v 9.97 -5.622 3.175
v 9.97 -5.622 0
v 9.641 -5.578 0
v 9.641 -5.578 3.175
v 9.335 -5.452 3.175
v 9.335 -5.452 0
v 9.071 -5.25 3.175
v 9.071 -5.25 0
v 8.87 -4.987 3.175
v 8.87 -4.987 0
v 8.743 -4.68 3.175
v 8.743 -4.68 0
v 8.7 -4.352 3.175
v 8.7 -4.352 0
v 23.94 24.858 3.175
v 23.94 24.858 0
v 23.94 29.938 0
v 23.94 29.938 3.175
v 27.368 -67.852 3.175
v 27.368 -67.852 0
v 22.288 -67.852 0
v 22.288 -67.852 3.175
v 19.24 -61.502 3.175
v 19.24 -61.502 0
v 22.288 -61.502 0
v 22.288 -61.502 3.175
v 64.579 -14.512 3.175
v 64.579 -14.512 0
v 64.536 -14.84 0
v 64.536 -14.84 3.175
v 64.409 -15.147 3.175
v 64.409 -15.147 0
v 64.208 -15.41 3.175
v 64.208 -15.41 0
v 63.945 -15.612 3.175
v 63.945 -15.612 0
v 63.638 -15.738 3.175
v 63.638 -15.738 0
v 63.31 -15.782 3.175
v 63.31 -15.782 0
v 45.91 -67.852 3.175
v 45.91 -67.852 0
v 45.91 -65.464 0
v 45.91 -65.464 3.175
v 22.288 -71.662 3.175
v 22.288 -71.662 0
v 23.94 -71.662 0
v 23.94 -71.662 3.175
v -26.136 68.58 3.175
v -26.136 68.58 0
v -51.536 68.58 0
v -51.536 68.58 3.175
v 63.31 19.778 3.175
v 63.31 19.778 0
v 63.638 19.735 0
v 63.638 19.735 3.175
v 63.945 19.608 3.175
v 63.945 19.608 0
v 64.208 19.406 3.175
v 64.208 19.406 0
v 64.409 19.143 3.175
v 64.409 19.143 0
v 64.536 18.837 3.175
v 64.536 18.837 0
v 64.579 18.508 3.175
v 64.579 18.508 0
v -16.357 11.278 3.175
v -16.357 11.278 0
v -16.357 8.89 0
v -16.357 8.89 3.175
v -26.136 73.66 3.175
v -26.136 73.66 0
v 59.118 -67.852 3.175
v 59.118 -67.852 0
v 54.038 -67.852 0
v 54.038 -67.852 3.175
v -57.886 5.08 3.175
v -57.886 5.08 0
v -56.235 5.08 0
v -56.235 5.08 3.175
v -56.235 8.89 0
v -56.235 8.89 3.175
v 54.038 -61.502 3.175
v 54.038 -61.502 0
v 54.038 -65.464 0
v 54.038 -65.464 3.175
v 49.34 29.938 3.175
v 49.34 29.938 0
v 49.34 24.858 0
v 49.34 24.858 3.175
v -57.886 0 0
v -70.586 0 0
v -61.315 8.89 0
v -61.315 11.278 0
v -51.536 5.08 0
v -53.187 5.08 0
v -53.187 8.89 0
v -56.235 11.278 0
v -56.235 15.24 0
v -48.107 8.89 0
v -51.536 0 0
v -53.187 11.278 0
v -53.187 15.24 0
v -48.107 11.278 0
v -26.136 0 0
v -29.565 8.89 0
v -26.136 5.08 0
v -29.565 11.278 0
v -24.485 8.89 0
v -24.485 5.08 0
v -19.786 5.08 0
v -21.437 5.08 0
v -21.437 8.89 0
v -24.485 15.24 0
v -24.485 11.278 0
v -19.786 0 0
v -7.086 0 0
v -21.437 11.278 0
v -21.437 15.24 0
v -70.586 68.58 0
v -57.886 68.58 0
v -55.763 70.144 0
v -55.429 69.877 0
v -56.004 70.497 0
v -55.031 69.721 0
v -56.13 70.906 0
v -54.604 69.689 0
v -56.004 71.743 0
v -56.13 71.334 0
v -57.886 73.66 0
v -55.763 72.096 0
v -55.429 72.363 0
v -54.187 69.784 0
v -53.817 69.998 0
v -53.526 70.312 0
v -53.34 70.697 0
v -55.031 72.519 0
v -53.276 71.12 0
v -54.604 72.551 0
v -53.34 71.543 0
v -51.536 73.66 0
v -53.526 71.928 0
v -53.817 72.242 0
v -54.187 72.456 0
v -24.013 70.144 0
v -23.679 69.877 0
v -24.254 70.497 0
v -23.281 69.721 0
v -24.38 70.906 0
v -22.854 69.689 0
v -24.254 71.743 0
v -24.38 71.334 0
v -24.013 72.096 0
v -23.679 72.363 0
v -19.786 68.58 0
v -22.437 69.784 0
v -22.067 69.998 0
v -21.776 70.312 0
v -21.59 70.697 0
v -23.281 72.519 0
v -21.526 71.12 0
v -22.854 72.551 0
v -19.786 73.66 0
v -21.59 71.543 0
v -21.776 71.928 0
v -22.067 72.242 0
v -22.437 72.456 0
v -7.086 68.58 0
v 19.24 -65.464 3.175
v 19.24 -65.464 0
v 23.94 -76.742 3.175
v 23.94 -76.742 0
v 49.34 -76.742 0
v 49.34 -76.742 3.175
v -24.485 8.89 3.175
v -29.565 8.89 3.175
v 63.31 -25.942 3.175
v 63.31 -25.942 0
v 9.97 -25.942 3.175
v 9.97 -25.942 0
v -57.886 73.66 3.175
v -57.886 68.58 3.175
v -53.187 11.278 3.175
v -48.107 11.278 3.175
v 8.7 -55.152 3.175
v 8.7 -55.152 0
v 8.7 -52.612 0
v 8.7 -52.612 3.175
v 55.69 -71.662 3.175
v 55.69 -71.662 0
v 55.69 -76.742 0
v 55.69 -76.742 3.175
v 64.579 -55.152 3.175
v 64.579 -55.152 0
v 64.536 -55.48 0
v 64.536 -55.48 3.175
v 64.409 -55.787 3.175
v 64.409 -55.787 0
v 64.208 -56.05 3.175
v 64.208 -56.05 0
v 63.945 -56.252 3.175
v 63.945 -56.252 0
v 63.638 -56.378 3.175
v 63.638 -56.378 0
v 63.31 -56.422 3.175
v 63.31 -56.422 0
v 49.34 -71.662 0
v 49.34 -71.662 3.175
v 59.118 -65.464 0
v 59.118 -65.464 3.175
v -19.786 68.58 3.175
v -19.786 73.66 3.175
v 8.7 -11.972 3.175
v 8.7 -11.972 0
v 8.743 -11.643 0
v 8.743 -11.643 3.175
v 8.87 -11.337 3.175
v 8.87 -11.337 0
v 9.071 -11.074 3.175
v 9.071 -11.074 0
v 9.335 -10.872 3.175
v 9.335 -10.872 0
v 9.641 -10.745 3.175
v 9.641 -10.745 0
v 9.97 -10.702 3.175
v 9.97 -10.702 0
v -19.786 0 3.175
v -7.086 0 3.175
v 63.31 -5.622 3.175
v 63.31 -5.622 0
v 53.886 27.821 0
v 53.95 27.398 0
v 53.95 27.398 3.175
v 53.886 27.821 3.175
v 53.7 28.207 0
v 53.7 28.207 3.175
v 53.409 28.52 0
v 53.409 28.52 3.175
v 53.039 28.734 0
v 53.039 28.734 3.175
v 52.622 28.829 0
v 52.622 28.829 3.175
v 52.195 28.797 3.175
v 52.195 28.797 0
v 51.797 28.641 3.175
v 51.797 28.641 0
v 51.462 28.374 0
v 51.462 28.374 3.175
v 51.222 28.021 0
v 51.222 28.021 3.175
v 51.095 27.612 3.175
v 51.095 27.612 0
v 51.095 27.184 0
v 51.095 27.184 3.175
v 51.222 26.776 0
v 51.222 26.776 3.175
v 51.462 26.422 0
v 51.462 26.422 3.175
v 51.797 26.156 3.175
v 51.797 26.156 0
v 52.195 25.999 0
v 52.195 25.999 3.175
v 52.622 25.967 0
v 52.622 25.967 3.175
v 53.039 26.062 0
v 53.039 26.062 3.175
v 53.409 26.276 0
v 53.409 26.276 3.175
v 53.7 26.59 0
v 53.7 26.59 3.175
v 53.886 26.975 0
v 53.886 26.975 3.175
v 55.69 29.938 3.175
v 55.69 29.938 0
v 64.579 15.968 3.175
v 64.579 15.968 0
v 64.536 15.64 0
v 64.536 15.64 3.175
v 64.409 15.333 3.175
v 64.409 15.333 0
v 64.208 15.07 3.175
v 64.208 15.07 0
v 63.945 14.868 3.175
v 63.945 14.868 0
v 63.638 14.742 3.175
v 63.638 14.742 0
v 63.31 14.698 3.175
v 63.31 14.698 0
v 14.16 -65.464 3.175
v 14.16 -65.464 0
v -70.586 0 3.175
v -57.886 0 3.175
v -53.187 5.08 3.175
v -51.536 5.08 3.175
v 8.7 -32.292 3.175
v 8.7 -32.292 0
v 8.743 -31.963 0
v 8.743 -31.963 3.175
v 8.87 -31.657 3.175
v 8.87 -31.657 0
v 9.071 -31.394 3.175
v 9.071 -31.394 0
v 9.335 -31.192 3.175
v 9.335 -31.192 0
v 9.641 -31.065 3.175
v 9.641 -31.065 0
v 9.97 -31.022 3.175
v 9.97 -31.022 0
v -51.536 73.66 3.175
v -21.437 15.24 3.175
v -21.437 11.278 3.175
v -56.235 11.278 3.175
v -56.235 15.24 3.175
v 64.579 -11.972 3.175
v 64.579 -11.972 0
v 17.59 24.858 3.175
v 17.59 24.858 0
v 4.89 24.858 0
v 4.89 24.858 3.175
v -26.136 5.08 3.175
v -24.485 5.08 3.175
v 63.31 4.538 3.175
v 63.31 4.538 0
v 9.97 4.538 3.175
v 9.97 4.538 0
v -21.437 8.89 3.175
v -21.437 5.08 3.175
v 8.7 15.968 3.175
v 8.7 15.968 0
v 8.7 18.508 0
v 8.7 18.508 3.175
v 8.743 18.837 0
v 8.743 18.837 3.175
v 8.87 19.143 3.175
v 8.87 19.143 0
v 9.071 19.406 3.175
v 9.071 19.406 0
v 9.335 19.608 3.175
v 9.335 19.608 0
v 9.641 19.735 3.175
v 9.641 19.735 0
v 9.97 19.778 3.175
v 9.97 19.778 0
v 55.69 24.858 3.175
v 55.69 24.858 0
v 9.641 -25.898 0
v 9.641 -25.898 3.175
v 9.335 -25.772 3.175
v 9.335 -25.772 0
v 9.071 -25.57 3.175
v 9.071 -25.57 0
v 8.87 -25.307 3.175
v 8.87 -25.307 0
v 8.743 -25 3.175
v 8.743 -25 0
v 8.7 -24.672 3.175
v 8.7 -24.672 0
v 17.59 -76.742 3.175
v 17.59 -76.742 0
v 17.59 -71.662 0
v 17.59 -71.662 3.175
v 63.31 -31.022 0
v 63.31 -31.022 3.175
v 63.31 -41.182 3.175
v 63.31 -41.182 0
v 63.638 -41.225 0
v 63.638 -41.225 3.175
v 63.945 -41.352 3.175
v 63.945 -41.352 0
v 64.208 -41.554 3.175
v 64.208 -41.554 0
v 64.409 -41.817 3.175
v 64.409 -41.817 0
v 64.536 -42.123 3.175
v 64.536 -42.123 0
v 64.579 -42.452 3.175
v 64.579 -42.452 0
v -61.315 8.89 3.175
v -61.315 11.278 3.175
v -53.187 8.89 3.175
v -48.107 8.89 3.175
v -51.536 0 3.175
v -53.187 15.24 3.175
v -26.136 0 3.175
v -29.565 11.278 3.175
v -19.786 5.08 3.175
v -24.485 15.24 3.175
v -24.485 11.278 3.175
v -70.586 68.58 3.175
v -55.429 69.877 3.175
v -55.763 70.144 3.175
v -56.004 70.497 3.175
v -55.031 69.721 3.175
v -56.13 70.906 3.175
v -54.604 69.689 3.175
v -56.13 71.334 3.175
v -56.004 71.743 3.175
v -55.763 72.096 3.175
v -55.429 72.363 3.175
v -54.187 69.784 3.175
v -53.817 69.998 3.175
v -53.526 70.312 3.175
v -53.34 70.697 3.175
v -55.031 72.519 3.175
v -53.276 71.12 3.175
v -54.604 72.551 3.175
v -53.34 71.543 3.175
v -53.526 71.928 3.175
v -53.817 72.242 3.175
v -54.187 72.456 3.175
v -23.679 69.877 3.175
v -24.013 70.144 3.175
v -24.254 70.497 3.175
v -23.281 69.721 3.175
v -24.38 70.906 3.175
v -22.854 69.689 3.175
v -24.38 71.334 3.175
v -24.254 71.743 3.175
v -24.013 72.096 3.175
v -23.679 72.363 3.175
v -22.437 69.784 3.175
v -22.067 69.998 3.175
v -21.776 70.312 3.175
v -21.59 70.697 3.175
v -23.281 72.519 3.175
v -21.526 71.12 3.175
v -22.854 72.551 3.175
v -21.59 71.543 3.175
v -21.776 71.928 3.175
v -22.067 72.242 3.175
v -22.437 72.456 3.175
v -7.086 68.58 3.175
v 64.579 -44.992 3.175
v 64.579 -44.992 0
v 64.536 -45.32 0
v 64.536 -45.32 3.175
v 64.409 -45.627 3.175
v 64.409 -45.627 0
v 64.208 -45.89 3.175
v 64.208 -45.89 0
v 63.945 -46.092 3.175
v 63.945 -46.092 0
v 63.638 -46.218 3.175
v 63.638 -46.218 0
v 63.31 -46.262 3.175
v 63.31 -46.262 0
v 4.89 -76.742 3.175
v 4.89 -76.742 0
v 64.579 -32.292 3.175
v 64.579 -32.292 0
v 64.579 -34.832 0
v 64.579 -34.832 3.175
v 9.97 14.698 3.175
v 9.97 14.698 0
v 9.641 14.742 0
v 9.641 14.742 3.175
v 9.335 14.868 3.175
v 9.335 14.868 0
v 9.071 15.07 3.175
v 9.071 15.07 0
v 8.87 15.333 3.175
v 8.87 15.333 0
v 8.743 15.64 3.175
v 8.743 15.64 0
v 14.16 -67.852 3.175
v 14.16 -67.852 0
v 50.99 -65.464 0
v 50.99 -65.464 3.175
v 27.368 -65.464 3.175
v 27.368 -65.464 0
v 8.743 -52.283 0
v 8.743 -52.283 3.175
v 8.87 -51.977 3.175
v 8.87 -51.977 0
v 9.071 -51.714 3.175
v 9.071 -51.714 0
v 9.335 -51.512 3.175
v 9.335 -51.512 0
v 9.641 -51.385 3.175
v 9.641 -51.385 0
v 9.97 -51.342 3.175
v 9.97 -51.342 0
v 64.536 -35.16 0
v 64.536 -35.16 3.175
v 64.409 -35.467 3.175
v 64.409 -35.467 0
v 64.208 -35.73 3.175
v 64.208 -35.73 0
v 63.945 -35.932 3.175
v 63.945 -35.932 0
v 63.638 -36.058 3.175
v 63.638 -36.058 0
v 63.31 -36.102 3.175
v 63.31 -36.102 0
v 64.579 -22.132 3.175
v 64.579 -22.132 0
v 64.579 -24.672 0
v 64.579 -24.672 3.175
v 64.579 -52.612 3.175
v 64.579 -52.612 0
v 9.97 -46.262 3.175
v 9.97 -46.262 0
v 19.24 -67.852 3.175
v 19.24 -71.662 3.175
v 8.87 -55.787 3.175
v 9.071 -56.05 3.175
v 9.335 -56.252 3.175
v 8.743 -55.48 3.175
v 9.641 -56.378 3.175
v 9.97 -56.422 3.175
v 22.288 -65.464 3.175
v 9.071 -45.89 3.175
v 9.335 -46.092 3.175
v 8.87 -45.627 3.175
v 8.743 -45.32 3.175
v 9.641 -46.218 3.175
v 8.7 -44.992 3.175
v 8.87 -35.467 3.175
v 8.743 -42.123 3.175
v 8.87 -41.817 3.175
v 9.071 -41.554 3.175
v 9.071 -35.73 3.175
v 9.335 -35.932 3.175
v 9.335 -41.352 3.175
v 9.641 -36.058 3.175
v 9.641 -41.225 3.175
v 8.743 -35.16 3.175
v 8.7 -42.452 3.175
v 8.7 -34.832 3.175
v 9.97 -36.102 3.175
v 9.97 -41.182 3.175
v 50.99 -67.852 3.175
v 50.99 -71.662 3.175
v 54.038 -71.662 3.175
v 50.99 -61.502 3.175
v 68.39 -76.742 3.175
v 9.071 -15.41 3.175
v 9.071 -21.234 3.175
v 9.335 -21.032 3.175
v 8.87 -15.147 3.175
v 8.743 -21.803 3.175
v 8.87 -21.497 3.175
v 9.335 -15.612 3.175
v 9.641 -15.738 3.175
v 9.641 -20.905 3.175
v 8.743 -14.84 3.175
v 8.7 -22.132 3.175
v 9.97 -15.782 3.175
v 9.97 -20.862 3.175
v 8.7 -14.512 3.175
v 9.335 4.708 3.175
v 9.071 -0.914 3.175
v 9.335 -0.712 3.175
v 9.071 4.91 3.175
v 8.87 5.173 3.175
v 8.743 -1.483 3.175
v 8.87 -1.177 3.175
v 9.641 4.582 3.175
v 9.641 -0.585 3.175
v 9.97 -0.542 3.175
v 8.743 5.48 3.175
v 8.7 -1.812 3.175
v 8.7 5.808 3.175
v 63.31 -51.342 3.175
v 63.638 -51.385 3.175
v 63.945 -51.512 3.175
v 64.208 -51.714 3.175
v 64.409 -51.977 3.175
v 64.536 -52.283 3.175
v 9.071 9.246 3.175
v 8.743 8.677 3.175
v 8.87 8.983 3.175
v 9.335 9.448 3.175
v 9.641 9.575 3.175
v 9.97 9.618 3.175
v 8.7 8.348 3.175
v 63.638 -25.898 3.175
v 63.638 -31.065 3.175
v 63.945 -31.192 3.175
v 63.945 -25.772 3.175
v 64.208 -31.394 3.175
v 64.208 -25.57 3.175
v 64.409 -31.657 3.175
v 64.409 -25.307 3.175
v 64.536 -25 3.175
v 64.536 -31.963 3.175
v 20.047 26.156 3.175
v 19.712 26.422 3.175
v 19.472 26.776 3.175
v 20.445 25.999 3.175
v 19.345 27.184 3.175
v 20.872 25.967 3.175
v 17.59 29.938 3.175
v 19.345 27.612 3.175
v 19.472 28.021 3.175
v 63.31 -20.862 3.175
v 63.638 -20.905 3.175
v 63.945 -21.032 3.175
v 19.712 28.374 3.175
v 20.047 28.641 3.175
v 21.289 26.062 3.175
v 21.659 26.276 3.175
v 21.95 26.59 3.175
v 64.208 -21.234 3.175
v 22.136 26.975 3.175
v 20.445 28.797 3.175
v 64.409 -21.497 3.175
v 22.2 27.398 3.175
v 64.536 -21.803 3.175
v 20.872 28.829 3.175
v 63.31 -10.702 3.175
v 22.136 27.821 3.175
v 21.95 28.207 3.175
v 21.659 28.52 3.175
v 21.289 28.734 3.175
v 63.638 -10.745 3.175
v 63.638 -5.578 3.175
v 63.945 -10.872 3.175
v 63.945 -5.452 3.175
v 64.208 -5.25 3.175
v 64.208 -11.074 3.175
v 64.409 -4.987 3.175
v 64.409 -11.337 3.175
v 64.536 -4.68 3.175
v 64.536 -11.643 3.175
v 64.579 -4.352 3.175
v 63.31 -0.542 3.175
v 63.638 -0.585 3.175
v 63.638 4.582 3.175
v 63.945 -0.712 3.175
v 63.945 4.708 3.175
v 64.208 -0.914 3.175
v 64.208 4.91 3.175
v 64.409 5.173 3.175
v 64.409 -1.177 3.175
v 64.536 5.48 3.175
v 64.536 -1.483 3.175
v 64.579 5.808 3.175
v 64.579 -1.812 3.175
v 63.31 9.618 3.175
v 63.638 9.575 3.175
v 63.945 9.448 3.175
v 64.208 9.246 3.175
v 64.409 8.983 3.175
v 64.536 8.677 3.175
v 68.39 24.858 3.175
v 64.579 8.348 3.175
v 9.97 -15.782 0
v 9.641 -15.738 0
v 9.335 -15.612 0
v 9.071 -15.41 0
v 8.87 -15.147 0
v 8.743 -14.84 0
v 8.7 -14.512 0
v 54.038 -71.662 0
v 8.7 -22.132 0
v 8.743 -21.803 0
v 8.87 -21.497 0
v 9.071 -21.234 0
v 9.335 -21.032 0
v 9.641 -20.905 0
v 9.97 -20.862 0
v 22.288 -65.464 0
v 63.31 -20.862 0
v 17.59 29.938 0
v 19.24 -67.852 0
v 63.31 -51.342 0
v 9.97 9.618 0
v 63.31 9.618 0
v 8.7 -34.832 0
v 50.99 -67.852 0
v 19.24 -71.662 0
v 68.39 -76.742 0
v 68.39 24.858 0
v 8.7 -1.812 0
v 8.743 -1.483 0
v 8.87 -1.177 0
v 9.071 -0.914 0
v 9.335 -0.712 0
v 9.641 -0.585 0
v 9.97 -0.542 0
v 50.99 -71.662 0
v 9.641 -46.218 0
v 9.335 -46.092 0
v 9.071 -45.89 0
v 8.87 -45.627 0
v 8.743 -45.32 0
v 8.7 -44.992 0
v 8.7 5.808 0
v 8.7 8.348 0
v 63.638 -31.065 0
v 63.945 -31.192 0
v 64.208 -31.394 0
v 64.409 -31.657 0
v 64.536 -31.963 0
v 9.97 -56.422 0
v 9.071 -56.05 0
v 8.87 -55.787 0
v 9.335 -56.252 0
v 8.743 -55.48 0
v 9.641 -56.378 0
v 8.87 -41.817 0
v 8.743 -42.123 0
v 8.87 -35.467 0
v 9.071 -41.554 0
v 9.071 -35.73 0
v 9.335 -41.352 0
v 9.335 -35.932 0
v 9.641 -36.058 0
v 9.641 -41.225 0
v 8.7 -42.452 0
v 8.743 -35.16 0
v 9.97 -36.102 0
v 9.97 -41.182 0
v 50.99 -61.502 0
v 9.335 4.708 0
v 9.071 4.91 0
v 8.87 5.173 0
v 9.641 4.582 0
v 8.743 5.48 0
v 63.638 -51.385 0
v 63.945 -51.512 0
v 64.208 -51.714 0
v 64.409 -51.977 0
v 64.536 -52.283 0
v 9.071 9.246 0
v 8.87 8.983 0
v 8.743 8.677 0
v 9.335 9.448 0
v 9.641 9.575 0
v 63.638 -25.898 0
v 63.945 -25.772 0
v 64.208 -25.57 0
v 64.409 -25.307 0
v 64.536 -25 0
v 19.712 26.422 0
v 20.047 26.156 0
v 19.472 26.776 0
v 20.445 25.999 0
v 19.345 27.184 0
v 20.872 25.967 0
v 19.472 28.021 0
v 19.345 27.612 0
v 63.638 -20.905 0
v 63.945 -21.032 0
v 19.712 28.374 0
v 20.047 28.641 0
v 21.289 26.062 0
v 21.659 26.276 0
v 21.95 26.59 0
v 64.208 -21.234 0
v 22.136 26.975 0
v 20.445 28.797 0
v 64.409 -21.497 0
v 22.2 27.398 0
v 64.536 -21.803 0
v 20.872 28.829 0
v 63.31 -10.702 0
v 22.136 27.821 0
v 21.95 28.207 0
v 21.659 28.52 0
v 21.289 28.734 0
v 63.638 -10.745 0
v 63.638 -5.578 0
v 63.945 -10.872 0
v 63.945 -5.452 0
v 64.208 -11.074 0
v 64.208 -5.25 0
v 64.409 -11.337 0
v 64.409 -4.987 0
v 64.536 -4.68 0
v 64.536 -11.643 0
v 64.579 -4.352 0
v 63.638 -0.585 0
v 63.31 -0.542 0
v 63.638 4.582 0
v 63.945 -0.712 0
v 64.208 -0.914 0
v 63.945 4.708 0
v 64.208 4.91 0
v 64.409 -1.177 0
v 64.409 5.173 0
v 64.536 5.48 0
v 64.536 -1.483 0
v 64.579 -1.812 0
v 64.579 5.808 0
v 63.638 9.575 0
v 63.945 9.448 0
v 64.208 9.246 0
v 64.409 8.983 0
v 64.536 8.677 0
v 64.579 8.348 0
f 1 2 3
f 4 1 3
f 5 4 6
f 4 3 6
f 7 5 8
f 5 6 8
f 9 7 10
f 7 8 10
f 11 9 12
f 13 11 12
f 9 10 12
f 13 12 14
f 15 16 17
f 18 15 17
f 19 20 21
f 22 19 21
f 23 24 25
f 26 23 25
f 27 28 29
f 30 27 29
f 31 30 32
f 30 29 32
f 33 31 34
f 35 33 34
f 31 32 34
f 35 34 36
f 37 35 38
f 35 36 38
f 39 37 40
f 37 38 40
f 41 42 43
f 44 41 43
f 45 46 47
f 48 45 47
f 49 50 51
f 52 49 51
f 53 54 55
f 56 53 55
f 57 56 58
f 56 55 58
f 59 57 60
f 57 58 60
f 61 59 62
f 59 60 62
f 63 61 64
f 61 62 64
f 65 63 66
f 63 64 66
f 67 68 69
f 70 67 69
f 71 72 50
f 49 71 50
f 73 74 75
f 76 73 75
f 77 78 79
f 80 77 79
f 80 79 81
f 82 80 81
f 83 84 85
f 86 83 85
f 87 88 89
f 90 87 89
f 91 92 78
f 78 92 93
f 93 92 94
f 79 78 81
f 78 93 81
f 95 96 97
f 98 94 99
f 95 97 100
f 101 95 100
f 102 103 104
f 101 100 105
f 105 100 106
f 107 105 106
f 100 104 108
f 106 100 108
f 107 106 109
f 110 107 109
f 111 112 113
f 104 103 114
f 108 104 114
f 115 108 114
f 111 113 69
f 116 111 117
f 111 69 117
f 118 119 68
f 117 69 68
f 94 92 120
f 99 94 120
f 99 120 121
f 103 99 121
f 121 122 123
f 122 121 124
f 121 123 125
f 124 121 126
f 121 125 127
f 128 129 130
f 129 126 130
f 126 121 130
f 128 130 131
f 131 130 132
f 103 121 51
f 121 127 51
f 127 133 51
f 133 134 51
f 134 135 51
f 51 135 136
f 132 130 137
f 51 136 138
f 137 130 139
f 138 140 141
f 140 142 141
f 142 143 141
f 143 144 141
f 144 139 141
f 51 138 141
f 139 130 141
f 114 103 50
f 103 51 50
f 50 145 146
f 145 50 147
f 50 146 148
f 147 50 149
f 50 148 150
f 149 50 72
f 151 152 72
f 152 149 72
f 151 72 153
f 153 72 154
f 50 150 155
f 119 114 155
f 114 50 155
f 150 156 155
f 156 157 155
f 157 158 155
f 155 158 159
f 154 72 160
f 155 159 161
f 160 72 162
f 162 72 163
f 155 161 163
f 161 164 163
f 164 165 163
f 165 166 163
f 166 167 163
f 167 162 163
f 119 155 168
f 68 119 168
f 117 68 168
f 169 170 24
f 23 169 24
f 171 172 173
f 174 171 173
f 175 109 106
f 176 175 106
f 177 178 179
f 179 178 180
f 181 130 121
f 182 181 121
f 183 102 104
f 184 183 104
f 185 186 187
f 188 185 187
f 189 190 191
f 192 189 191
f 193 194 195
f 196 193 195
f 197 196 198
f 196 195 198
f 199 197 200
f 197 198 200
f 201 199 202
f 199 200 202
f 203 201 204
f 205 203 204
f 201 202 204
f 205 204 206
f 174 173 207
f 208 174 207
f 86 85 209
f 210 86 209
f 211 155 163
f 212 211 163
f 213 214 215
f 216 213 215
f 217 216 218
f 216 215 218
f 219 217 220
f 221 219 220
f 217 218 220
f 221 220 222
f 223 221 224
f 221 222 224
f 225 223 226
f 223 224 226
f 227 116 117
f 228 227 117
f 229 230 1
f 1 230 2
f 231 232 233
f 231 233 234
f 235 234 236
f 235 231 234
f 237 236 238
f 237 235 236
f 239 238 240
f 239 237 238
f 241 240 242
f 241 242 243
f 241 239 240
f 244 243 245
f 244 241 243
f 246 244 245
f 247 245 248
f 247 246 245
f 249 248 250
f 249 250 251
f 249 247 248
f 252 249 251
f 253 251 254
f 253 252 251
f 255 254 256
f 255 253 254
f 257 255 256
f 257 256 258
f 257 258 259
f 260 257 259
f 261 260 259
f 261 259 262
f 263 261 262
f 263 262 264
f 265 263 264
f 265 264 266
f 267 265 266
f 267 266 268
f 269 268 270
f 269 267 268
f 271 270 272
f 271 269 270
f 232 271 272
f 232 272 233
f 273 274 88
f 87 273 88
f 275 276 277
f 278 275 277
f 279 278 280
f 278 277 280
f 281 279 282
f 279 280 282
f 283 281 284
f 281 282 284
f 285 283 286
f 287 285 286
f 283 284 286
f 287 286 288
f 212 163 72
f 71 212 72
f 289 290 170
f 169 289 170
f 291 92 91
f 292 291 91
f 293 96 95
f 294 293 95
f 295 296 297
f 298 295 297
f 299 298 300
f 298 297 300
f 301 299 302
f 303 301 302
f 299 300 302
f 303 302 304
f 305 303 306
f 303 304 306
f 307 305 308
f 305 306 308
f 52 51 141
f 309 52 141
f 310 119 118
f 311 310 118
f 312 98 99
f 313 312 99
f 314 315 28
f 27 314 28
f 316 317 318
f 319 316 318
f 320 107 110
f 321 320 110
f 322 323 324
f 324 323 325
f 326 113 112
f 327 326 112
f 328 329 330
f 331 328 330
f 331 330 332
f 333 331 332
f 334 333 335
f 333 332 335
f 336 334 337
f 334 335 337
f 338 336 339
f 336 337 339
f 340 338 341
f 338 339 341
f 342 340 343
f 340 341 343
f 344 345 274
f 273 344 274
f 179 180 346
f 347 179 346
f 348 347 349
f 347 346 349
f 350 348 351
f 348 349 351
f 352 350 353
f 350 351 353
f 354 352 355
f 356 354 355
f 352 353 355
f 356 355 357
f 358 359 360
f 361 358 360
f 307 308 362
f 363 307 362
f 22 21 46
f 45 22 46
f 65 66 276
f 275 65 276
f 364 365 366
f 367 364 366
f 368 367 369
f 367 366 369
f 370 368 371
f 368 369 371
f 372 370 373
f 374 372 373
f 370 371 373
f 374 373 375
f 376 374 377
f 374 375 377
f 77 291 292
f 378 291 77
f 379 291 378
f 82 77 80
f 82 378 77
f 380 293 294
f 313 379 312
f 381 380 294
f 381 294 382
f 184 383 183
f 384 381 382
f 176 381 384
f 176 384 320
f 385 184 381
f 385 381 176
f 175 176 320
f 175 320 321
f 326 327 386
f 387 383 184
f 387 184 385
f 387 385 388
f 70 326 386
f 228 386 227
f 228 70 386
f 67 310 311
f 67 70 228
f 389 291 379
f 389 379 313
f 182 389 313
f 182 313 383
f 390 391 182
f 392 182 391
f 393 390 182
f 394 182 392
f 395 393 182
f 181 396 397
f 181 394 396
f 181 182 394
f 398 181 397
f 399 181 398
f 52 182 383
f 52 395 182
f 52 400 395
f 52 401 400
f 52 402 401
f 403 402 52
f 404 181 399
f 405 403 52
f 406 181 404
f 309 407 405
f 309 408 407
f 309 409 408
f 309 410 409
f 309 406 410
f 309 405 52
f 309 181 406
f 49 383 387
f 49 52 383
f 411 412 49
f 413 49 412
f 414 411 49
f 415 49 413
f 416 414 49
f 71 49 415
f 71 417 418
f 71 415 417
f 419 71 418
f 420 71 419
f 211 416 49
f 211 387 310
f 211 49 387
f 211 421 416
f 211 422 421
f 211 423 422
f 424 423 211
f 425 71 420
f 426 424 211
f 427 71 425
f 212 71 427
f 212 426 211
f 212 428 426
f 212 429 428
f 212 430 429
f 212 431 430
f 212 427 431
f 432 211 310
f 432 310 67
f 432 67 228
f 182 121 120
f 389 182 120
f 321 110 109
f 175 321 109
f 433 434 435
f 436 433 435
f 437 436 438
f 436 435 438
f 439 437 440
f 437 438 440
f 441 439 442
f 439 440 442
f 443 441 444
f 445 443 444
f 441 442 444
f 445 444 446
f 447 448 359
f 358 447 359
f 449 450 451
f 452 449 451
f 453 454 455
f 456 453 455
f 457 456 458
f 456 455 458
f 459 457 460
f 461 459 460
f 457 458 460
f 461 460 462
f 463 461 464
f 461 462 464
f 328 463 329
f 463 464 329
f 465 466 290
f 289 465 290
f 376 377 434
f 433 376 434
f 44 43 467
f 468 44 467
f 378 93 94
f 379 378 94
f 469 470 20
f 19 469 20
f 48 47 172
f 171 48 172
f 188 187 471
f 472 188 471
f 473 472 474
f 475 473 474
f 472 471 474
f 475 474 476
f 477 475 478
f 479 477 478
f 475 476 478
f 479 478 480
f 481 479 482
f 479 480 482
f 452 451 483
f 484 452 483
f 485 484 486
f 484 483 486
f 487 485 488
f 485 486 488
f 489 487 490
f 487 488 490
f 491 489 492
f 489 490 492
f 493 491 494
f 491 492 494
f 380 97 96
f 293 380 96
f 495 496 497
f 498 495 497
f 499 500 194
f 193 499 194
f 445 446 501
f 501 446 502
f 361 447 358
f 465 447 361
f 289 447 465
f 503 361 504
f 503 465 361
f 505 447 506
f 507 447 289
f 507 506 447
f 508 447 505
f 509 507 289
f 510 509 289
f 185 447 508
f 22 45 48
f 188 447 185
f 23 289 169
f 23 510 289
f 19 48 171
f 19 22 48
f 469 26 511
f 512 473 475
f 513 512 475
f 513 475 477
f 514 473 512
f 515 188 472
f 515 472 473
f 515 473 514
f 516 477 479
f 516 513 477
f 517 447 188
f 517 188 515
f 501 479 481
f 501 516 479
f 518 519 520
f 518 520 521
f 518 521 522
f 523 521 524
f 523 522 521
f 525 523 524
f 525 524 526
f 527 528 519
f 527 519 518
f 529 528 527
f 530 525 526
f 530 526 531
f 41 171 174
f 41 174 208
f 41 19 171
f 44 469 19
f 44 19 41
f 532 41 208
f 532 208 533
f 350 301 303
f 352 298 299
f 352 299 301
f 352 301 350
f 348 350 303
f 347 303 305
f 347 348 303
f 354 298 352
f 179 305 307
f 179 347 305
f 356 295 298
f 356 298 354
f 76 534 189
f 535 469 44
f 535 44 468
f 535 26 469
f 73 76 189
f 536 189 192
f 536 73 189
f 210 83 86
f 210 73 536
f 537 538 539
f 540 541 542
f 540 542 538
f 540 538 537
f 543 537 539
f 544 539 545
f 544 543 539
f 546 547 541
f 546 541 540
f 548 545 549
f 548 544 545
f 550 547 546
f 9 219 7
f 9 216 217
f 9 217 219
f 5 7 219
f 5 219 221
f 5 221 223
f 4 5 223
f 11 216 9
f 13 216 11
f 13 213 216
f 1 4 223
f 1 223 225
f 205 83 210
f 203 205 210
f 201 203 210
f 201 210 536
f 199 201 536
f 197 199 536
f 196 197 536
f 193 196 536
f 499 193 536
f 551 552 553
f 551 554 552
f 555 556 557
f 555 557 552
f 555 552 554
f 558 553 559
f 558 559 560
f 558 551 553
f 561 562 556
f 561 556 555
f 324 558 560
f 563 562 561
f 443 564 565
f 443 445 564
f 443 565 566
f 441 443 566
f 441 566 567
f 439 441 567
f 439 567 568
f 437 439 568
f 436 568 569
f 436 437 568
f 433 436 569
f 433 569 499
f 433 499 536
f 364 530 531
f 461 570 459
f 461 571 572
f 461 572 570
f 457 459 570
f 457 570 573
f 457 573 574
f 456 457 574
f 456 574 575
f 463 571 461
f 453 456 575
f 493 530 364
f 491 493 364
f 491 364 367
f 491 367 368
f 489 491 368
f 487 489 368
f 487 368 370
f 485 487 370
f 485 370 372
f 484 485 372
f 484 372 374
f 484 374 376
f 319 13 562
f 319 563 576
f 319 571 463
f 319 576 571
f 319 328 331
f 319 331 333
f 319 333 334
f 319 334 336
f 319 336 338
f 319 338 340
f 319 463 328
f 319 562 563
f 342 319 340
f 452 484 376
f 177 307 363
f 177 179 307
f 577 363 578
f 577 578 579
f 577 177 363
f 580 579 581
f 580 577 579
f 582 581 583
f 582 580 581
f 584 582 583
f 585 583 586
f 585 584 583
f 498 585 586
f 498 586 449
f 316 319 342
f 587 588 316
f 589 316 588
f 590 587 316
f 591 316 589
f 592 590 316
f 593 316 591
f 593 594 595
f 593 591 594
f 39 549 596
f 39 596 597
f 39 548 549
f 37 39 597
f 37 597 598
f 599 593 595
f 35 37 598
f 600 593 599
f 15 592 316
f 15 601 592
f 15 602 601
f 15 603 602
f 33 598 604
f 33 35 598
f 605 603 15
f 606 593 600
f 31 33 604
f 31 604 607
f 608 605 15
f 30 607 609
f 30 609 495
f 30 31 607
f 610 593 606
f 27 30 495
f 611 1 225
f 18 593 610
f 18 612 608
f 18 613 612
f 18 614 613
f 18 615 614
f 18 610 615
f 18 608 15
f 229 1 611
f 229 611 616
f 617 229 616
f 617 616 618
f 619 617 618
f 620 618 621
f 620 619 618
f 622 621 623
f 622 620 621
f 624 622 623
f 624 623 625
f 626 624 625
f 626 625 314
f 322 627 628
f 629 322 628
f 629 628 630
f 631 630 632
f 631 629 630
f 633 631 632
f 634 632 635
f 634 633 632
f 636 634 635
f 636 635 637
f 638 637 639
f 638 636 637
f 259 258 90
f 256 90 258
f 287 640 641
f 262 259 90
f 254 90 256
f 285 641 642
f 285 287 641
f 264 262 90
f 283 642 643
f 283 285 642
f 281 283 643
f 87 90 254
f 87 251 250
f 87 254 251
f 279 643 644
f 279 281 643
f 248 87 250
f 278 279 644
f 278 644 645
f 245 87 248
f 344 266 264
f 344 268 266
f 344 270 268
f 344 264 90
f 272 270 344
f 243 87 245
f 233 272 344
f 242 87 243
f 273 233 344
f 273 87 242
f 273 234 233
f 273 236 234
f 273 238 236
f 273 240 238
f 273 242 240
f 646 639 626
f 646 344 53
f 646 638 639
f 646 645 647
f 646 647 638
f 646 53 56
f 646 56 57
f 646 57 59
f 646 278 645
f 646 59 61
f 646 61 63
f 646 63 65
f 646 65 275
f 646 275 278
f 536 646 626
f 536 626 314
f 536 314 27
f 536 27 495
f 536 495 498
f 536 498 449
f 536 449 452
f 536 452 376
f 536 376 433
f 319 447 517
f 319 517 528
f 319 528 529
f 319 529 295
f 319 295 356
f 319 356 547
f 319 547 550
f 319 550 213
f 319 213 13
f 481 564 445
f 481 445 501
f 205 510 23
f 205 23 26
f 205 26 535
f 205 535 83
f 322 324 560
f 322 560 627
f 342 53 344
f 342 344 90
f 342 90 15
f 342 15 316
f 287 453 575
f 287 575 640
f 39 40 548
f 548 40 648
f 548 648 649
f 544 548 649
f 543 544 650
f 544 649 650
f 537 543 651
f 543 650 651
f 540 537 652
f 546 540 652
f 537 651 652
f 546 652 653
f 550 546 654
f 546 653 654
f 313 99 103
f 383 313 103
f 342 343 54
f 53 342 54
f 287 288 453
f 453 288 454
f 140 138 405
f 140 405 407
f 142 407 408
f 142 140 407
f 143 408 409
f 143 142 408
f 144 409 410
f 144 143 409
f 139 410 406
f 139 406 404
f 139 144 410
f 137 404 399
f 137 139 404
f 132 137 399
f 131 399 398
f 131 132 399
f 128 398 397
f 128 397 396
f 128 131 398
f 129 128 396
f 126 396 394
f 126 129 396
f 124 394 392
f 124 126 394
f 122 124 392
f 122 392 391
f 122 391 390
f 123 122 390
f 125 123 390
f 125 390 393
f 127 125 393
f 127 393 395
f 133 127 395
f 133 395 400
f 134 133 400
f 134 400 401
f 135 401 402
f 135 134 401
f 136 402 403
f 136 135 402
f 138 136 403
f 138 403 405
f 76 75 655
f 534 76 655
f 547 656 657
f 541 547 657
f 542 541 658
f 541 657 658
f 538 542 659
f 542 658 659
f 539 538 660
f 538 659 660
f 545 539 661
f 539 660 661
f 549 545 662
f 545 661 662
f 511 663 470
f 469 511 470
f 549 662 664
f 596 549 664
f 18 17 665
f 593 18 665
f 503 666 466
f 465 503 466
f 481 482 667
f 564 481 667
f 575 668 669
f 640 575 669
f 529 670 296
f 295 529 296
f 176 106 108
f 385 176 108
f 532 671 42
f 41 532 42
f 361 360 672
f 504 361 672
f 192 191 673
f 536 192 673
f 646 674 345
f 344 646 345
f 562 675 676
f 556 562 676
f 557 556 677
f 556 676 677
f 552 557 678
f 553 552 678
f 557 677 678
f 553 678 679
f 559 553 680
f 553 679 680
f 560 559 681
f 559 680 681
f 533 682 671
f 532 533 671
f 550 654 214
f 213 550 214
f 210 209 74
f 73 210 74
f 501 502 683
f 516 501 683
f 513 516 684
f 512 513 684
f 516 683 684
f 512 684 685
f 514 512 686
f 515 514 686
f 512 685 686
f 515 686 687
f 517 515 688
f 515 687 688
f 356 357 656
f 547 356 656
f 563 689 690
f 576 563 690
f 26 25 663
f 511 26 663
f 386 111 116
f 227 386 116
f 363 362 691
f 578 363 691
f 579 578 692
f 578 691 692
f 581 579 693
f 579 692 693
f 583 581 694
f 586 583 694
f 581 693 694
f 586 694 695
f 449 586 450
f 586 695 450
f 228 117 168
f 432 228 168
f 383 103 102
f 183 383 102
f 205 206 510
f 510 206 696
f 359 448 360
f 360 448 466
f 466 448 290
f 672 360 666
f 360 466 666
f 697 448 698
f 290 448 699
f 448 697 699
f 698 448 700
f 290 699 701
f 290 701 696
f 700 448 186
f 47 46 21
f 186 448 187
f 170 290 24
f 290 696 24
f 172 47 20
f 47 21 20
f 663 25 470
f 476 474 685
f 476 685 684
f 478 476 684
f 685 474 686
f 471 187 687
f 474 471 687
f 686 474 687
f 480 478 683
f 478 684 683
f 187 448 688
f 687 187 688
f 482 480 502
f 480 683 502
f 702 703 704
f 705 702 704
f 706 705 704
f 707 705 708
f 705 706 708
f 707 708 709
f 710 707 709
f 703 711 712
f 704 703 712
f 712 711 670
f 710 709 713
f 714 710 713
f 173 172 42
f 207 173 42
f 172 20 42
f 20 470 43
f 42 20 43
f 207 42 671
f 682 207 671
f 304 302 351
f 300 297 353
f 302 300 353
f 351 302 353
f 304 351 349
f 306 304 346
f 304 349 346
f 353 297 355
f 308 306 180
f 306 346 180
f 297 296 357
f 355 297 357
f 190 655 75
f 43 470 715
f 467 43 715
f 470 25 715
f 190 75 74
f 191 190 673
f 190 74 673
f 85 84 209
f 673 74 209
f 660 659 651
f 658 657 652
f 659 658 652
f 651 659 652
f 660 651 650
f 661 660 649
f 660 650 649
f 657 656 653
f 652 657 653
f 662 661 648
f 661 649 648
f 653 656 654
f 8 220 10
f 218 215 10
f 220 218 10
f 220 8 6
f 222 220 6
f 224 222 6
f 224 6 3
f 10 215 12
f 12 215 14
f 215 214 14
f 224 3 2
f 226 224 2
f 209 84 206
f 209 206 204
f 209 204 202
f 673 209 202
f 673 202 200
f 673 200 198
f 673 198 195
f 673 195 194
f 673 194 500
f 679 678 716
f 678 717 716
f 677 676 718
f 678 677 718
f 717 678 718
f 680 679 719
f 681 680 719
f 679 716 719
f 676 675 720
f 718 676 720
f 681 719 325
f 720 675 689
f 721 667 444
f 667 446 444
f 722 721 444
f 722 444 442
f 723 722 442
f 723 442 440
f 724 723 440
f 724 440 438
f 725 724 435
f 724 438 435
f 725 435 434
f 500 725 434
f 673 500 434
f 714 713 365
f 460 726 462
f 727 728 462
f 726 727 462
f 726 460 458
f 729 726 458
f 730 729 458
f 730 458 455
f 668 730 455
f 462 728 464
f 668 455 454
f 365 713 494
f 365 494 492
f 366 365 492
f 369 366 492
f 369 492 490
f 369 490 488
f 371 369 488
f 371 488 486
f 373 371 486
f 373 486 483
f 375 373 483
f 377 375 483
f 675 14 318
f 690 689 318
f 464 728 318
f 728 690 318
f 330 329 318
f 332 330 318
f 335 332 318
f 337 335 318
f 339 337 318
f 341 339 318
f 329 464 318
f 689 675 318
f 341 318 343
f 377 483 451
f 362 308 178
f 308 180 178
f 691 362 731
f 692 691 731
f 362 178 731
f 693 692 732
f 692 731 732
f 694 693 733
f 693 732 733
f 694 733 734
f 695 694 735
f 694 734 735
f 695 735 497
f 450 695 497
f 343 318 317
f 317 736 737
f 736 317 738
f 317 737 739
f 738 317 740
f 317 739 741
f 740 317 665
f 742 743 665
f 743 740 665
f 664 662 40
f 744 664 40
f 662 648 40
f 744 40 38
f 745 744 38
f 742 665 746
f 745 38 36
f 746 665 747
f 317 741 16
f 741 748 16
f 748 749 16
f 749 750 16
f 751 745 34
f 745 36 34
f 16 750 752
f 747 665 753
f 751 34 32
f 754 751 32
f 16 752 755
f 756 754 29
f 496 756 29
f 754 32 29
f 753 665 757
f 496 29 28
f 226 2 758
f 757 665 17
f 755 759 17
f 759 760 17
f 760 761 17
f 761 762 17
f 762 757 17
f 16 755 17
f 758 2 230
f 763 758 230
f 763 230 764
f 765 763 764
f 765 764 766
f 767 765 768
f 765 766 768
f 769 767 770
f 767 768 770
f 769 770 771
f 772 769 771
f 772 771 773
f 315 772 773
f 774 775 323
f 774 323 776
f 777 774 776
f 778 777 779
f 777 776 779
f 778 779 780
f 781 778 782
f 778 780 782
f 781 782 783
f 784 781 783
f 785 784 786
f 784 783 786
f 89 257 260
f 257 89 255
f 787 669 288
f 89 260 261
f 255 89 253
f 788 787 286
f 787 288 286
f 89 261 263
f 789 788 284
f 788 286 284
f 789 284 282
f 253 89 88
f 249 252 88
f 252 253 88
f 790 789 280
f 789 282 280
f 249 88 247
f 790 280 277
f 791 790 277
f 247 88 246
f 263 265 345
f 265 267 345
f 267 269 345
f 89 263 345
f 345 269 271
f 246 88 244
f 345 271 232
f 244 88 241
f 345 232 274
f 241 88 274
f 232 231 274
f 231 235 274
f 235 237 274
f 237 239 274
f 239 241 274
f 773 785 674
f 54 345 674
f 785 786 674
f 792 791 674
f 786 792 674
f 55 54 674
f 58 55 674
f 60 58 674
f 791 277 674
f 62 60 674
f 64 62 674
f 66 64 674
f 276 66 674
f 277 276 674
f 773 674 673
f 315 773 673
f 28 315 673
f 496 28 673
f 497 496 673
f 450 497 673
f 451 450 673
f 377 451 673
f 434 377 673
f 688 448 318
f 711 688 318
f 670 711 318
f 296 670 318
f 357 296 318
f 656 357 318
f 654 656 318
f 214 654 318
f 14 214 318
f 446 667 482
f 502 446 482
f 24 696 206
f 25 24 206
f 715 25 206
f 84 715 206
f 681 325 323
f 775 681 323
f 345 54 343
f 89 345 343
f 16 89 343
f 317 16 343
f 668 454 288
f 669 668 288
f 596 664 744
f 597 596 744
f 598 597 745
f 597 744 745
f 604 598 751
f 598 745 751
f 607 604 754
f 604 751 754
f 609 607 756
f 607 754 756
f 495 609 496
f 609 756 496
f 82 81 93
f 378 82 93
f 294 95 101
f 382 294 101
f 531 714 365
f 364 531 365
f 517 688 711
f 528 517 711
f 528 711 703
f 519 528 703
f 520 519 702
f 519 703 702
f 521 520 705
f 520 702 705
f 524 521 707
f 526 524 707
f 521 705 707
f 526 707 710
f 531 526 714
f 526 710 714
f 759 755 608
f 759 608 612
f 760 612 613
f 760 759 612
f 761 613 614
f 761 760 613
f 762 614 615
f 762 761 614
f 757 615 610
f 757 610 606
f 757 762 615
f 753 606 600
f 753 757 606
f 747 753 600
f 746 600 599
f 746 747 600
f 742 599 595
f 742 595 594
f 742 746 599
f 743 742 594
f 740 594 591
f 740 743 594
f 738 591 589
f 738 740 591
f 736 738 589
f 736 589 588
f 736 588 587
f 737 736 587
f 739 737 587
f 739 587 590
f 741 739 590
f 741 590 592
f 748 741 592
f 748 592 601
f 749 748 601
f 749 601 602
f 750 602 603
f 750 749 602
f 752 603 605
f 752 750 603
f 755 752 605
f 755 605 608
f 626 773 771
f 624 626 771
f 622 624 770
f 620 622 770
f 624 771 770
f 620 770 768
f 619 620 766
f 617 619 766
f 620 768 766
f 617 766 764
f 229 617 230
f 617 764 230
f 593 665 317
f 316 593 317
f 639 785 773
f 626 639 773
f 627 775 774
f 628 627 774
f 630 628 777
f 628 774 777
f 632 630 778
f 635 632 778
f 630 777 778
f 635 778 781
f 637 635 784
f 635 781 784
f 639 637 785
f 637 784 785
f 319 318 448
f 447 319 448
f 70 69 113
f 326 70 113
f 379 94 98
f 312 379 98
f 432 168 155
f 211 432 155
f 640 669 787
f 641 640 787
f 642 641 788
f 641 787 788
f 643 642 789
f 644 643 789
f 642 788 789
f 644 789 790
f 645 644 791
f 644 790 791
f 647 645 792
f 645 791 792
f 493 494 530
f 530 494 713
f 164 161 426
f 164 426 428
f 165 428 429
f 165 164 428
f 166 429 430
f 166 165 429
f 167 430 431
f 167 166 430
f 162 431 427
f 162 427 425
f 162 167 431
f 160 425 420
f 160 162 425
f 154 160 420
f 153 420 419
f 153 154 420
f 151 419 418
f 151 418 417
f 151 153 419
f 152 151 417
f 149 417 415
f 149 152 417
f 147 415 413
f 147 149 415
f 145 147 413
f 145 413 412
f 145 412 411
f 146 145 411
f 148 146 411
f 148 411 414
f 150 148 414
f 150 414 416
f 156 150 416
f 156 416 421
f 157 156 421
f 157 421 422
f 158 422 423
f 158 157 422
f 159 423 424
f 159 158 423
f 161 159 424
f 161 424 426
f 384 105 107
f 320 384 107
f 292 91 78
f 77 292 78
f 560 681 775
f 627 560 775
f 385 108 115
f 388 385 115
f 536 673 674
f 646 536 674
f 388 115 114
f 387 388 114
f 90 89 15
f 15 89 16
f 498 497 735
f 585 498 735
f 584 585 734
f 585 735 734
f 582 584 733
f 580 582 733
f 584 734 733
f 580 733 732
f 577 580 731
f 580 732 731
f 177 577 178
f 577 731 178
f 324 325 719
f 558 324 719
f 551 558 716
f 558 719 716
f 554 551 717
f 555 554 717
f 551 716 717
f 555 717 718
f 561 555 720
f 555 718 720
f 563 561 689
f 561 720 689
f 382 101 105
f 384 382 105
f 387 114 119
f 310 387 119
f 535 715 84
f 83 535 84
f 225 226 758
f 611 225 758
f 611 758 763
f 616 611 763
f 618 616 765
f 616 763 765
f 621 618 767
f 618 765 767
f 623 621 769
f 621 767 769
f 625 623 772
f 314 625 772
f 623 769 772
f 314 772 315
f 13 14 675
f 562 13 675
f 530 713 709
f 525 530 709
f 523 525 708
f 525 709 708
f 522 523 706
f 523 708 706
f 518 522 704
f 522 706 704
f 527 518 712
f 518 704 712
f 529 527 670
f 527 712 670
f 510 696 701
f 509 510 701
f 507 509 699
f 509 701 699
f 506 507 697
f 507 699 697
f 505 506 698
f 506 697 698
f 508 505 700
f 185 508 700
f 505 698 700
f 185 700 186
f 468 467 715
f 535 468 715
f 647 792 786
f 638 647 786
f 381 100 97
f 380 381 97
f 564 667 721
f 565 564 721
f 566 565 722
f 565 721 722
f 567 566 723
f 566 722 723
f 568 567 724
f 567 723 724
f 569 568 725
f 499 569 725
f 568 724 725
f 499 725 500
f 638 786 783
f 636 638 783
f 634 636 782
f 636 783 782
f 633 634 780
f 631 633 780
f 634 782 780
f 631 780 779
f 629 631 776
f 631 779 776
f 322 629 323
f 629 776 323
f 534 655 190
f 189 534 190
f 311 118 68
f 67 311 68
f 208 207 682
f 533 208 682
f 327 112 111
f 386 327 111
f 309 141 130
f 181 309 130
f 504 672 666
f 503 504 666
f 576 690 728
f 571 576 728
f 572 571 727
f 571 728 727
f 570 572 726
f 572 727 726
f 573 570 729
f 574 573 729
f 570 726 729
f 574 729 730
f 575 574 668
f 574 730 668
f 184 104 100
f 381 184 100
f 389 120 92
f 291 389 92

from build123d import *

# Parameters (mm, degrees)
F0_R     = 1.4351
F1_DEPTH = 3.175
F2_R     = 1.4351
F3_DEPTH = 3.175


with BuildPart() as f1:
    # F0 (on Top) → F1 (new body)
    with BuildSketch(Plane.XY):
        Polygon((-21.437375, 5.08), (-19.786375, 5.08), (-19.786375, 0), (-7.086375, 0), (-7.086375, 5.08), (-7.086375, 68.58), (-19.786375, 68.58), (-19.786375, 73.66), (-26.136375, 73.66), (-26.136375, 68.58), (-51.536375, 68.58), (-51.536375, 71.12), (-51.536375, 73.66), (-57.886375, 73.66), (-57.886375, 68.58), (-70.586375, 68.58), (-70.586375, 5.08), (-70.586375, 0), (-57.886375, 0), (-57.886375, 5.08), (-56.235375, 5.08), (-56.235375, 8.89), (-61.315375, 8.89), (-61.315375, 11.2776), (-56.235375, 11.2776), (-56.235375, 15.24), (-54.711375, 15.24), (-53.187375, 15.24), (-53.187375, 11.2776), (-48.107375, 11.2776), (-48.107375, 8.89), (-53.187375, 8.89), (-53.187375, 5.08), (-51.536375, 5.08), (-51.536375, 0), (-26.136375, 0), (-26.136375, 5.08), (-24.485375, 5.08), (-24.485375, 8.89), (-29.565375, 8.89), (-29.565375, 11.2776), (-24.485375, 11.2776), (-24.485375, 15.24), (-22.961375, 15.24), (-21.437375, 15.24), (-21.437375, 11.2776), (-16.357375, 11.2776), (-16.357375, 8.89), (-21.437375, 8.89), align=None)
        with Locations((-54.711375, 71.12)):
            Circle(F0_R, mode=Mode.SUBTRACT)
        with Locations((-22.961375, 71.12)):
            Circle(F0_R, mode=Mode.SUBTRACT)
    extrude(amount=F1_DEPTH)


with BuildPart() as f3:
    # F2 (on Top) → F3 (new body)
    with BuildSketch(Plane.XY):
        Polygon((54.0385, -71.661652), (55.6895, -71.661652), (55.6895, -76.741652), (68.3895, -76.741652), (68.3895, -71.661652), (68.3895, 24.858348), (55.6895, 24.858348), (55.6895, 29.938348), (49.3395, 29.938348), (49.3395, 24.858348), (23.9395, 24.858348), (23.9395, 27.398348), (23.9395, 29.938348), (17.5895, 29.938348), (17.5895, 24.858348), (4.8895, 24.858348), (4.8895, -71.661652), (4.8895, -76.741652), (17.5895, -76.741652), (17.5895, -71.661652), (19.2405, -71.661652), (19.2405, -67.851652), (14.1605, -67.851652), (14.1605, -65.464052), (19.2405, -65.464052), (19.2405, -61.501652), (20.7645, -61.501652), (22.2885, -61.501652), (22.2885, -65.464052), (27.3685, -65.464052), (27.3685, -67.851652), (22.2885, -67.851652), (22.2885, -71.661652), (23.9395, -71.661652), (23.9395, -76.741652), (49.3395, -76.741652), (49.3395, -71.661652), (50.9905, -71.661652), (50.9905, -67.851652), (45.9105, -67.851652), (45.9105, -65.464052), (50.9905, -65.464052), (50.9905, -61.501652), (52.5145, -61.501652), (54.0385, -61.501652), (54.0385, -65.464052), (59.1185, -65.464052), (59.1185, -67.851652), (54.0385, -67.851652), align=None)
        with BuildLine():
            ThreePointArc((8.6995, -52.611652), (9.071475, -51.713626), (9.9695, -51.341652))
            Line((9.9695, -51.341652), (63.3095, -51.341652))
            ThreePointArc((63.3095, -51.341652), (64.207526, -51.713626), (64.5795, -52.611652))
            Line((64.5795, -52.611652), (64.5795, -55.151652))
            ThreePointArc((64.5795, -55.151652), (64.207526, -56.049678), (63.3095, -56.421652))
            Line((63.3095, -56.421652), (9.9695, -56.421652))
            ThreePointArc((9.9695, -56.421652), (9.071475, -56.049678), (8.6995, -55.151652))
            Line((8.6995, -55.151652), (8.6995, -52.611652))
        make_face(mode=Mode.SUBTRACT)
        with BuildLine():
            ThreePointArc((8.6995, -42.451652), (9.071475, -41.553626), (9.9695, -41.181652))
            Line((9.9695, -41.181652), (63.3095, -41.181652))
            ThreePointArc((63.3095, -41.181652), (64.207526, -41.553626), (64.5795, -42.451652))
            Line((64.5795, -42.451652), (64.5795, -44.991652))
            ThreePointArc((64.5795, -44.991652), (64.207526, -45.889678), (63.3095, -46.261652))
            Line((63.3095, -46.261652), (9.9695, -46.261652))
            ThreePointArc((9.9695, -46.261652), (9.071475, -45.889678), (8.6995, -44.991652))
            Line((8.6995, -44.991652), (8.6995, -42.451652))
        make_face(mode=Mode.SUBTRACT)
        with BuildLine():
            ThreePointArc((8.6995, -22.131652), (9.071475, -21.233626), (9.9695, -20.861652))
            Line((9.9695, -20.861652), (63.3095, -20.861652))
            ThreePointArc((63.3095, -20.861652), (64.207526, -21.233626), (64.5795, -22.131652))
            Line((64.5795, -22.131652), (64.5795, -24.671652))
            ThreePointArc((64.5795, -24.671652), (64.207526, -25.569678), (63.3095, -25.941652))
            Line((63.3095, -25.941652), (9.9695, -25.941652))
            ThreePointArc((9.9695, -25.941652), (9.071475, -25.569678), (8.6995, -24.671652))
            Line((8.6995, -24.671652), (8.6995, -22.131652))
        make_face(mode=Mode.SUBTRACT)
        with BuildLine():
            ThreePointArc((8.6995, -32.291652), (9.071475, -31.393626), (9.9695, -31.021652))
            Line((9.9695, -31.021652), (63.3095, -31.021652))
            ThreePointArc((63.3095, -31.021652), (64.207526, -31.393626), (64.5795, -32.291652))
            Line((64.5795, -32.291652), (64.5795, -34.831652))
            ThreePointArc((64.5795, -34.831652), (64.207526, -35.729678), (63.3095, -36.101652))
            Line((63.3095, -36.101652), (9.9695, -36.101652))
            ThreePointArc((9.9695, -36.101652), (9.071475, -35.729678), (8.6995, -34.831652))
            Line((8.6995, -34.831652), (8.6995, -32.291652))
        make_face(mode=Mode.SUBTRACT)
        with Locations((20.7645, 27.398348)):
            Circle(F2_R, mode=Mode.SUBTRACT)
        with BuildLine():
            ThreePointArc((8.6995, -11.971652), (9.071475, -11.073626), (9.9695, -10.701652))
            Line((9.9695, -10.701652), (63.3095, -10.701652))
            ThreePointArc((63.3095, -10.701652), (64.207526, -11.073626), (64.5795, -11.971652))
            Line((64.5795, -11.971652), (64.5795, -14.511652))
            ThreePointArc((64.5795, -14.511652), (64.207526, -15.409678), (63.3095, -15.781652))
            Line((63.3095, -15.781652), (9.9695, -15.781652))
            ThreePointArc((9.9695, -15.781652), (9.071475, -15.409678), (8.6995, -14.511652))
            Line((8.6995, -14.511652), (8.6995, -11.971652))
        make_face(mode=Mode.SUBTRACT)
        with BuildLine():
            ThreePointArc((8.6995, -1.811652), (9.071475, -0.913626), (9.9695, -0.541652))
            Line((9.9695, -0.541652), (63.3095, -0.541652))
            ThreePointArc((63.3095, -0.541652), (64.207526, -0.913626), (64.5795, -1.811652))
            Line((64.5795, -1.811652), (64.5795, -4.351652))
            ThreePointArc((64.5795, -4.351652), (64.207526, -5.249678), (63.3095, -5.621652))
            Line((63.3095, -5.621652), (9.9695, -5.621652))
            ThreePointArc((9.9695, -5.621652), (9.071475, -5.249678), (8.6995, -4.351652))
            Line((8.6995, -4.351652), (8.6995, -1.811652))
        make_face(mode=Mode.SUBTRACT)
        with BuildLine():
            ThreePointArc((8.6995, 8.348348), (9.071475, 9.246374), (9.9695, 9.618348))
            Line((9.9695, 9.618348), (63.3095, 9.618348))
            ThreePointArc((63.3095, 9.618348), (64.207526, 9.246374), (64.5795, 8.348348))
            Line((64.5795, 8.348348), (64.5795, 5.808348))
            ThreePointArc((64.5795, 5.808348), (64.207526, 4.910322), (63.3095, 4.538348))
            Line((63.3095, 4.538348), (9.9695, 4.538348))
            ThreePointArc((9.9695, 4.538348), (9.071475, 4.910322), (8.6995, 5.808348))
            Line((8.6995, 5.808348), (8.6995, 8.348348))
        make_face(mode=Mode.SUBTRACT)
        with BuildLine():
            ThreePointArc((8.6995, 18.508348), (9.071475, 19.406374), (9.9695, 19.778348))
            Line((9.9695, 19.778348), (63.3095, 19.778348))
            ThreePointArc((63.3095, 19.778348), (64.207526, 19.406374), (64.5795, 18.508348))
            Line((64.5795, 18.508348), (64.5795, 15.968348))
            ThreePointArc((64.5795, 15.968348), (64.207526, 15.070322), (63.3095, 14.698348))
            Line((63.3095, 14.698348), (9.9695, 14.698348))
            ThreePointArc((9.9695, 14.698348), (9.071475, 15.070322), (8.6995, 15.968348))
            Line((8.6995, 15.968348), (8.6995, 18.508348))
        make_face(mode=Mode.SUBTRACT)
        with Locations((52.5145, 27.398348)):
            Circle(F2_R, mode=Mode.SUBTRACT)
    extrude(amount=F3_DEPTH)


solid = Compound([f1.part, f3.part])
